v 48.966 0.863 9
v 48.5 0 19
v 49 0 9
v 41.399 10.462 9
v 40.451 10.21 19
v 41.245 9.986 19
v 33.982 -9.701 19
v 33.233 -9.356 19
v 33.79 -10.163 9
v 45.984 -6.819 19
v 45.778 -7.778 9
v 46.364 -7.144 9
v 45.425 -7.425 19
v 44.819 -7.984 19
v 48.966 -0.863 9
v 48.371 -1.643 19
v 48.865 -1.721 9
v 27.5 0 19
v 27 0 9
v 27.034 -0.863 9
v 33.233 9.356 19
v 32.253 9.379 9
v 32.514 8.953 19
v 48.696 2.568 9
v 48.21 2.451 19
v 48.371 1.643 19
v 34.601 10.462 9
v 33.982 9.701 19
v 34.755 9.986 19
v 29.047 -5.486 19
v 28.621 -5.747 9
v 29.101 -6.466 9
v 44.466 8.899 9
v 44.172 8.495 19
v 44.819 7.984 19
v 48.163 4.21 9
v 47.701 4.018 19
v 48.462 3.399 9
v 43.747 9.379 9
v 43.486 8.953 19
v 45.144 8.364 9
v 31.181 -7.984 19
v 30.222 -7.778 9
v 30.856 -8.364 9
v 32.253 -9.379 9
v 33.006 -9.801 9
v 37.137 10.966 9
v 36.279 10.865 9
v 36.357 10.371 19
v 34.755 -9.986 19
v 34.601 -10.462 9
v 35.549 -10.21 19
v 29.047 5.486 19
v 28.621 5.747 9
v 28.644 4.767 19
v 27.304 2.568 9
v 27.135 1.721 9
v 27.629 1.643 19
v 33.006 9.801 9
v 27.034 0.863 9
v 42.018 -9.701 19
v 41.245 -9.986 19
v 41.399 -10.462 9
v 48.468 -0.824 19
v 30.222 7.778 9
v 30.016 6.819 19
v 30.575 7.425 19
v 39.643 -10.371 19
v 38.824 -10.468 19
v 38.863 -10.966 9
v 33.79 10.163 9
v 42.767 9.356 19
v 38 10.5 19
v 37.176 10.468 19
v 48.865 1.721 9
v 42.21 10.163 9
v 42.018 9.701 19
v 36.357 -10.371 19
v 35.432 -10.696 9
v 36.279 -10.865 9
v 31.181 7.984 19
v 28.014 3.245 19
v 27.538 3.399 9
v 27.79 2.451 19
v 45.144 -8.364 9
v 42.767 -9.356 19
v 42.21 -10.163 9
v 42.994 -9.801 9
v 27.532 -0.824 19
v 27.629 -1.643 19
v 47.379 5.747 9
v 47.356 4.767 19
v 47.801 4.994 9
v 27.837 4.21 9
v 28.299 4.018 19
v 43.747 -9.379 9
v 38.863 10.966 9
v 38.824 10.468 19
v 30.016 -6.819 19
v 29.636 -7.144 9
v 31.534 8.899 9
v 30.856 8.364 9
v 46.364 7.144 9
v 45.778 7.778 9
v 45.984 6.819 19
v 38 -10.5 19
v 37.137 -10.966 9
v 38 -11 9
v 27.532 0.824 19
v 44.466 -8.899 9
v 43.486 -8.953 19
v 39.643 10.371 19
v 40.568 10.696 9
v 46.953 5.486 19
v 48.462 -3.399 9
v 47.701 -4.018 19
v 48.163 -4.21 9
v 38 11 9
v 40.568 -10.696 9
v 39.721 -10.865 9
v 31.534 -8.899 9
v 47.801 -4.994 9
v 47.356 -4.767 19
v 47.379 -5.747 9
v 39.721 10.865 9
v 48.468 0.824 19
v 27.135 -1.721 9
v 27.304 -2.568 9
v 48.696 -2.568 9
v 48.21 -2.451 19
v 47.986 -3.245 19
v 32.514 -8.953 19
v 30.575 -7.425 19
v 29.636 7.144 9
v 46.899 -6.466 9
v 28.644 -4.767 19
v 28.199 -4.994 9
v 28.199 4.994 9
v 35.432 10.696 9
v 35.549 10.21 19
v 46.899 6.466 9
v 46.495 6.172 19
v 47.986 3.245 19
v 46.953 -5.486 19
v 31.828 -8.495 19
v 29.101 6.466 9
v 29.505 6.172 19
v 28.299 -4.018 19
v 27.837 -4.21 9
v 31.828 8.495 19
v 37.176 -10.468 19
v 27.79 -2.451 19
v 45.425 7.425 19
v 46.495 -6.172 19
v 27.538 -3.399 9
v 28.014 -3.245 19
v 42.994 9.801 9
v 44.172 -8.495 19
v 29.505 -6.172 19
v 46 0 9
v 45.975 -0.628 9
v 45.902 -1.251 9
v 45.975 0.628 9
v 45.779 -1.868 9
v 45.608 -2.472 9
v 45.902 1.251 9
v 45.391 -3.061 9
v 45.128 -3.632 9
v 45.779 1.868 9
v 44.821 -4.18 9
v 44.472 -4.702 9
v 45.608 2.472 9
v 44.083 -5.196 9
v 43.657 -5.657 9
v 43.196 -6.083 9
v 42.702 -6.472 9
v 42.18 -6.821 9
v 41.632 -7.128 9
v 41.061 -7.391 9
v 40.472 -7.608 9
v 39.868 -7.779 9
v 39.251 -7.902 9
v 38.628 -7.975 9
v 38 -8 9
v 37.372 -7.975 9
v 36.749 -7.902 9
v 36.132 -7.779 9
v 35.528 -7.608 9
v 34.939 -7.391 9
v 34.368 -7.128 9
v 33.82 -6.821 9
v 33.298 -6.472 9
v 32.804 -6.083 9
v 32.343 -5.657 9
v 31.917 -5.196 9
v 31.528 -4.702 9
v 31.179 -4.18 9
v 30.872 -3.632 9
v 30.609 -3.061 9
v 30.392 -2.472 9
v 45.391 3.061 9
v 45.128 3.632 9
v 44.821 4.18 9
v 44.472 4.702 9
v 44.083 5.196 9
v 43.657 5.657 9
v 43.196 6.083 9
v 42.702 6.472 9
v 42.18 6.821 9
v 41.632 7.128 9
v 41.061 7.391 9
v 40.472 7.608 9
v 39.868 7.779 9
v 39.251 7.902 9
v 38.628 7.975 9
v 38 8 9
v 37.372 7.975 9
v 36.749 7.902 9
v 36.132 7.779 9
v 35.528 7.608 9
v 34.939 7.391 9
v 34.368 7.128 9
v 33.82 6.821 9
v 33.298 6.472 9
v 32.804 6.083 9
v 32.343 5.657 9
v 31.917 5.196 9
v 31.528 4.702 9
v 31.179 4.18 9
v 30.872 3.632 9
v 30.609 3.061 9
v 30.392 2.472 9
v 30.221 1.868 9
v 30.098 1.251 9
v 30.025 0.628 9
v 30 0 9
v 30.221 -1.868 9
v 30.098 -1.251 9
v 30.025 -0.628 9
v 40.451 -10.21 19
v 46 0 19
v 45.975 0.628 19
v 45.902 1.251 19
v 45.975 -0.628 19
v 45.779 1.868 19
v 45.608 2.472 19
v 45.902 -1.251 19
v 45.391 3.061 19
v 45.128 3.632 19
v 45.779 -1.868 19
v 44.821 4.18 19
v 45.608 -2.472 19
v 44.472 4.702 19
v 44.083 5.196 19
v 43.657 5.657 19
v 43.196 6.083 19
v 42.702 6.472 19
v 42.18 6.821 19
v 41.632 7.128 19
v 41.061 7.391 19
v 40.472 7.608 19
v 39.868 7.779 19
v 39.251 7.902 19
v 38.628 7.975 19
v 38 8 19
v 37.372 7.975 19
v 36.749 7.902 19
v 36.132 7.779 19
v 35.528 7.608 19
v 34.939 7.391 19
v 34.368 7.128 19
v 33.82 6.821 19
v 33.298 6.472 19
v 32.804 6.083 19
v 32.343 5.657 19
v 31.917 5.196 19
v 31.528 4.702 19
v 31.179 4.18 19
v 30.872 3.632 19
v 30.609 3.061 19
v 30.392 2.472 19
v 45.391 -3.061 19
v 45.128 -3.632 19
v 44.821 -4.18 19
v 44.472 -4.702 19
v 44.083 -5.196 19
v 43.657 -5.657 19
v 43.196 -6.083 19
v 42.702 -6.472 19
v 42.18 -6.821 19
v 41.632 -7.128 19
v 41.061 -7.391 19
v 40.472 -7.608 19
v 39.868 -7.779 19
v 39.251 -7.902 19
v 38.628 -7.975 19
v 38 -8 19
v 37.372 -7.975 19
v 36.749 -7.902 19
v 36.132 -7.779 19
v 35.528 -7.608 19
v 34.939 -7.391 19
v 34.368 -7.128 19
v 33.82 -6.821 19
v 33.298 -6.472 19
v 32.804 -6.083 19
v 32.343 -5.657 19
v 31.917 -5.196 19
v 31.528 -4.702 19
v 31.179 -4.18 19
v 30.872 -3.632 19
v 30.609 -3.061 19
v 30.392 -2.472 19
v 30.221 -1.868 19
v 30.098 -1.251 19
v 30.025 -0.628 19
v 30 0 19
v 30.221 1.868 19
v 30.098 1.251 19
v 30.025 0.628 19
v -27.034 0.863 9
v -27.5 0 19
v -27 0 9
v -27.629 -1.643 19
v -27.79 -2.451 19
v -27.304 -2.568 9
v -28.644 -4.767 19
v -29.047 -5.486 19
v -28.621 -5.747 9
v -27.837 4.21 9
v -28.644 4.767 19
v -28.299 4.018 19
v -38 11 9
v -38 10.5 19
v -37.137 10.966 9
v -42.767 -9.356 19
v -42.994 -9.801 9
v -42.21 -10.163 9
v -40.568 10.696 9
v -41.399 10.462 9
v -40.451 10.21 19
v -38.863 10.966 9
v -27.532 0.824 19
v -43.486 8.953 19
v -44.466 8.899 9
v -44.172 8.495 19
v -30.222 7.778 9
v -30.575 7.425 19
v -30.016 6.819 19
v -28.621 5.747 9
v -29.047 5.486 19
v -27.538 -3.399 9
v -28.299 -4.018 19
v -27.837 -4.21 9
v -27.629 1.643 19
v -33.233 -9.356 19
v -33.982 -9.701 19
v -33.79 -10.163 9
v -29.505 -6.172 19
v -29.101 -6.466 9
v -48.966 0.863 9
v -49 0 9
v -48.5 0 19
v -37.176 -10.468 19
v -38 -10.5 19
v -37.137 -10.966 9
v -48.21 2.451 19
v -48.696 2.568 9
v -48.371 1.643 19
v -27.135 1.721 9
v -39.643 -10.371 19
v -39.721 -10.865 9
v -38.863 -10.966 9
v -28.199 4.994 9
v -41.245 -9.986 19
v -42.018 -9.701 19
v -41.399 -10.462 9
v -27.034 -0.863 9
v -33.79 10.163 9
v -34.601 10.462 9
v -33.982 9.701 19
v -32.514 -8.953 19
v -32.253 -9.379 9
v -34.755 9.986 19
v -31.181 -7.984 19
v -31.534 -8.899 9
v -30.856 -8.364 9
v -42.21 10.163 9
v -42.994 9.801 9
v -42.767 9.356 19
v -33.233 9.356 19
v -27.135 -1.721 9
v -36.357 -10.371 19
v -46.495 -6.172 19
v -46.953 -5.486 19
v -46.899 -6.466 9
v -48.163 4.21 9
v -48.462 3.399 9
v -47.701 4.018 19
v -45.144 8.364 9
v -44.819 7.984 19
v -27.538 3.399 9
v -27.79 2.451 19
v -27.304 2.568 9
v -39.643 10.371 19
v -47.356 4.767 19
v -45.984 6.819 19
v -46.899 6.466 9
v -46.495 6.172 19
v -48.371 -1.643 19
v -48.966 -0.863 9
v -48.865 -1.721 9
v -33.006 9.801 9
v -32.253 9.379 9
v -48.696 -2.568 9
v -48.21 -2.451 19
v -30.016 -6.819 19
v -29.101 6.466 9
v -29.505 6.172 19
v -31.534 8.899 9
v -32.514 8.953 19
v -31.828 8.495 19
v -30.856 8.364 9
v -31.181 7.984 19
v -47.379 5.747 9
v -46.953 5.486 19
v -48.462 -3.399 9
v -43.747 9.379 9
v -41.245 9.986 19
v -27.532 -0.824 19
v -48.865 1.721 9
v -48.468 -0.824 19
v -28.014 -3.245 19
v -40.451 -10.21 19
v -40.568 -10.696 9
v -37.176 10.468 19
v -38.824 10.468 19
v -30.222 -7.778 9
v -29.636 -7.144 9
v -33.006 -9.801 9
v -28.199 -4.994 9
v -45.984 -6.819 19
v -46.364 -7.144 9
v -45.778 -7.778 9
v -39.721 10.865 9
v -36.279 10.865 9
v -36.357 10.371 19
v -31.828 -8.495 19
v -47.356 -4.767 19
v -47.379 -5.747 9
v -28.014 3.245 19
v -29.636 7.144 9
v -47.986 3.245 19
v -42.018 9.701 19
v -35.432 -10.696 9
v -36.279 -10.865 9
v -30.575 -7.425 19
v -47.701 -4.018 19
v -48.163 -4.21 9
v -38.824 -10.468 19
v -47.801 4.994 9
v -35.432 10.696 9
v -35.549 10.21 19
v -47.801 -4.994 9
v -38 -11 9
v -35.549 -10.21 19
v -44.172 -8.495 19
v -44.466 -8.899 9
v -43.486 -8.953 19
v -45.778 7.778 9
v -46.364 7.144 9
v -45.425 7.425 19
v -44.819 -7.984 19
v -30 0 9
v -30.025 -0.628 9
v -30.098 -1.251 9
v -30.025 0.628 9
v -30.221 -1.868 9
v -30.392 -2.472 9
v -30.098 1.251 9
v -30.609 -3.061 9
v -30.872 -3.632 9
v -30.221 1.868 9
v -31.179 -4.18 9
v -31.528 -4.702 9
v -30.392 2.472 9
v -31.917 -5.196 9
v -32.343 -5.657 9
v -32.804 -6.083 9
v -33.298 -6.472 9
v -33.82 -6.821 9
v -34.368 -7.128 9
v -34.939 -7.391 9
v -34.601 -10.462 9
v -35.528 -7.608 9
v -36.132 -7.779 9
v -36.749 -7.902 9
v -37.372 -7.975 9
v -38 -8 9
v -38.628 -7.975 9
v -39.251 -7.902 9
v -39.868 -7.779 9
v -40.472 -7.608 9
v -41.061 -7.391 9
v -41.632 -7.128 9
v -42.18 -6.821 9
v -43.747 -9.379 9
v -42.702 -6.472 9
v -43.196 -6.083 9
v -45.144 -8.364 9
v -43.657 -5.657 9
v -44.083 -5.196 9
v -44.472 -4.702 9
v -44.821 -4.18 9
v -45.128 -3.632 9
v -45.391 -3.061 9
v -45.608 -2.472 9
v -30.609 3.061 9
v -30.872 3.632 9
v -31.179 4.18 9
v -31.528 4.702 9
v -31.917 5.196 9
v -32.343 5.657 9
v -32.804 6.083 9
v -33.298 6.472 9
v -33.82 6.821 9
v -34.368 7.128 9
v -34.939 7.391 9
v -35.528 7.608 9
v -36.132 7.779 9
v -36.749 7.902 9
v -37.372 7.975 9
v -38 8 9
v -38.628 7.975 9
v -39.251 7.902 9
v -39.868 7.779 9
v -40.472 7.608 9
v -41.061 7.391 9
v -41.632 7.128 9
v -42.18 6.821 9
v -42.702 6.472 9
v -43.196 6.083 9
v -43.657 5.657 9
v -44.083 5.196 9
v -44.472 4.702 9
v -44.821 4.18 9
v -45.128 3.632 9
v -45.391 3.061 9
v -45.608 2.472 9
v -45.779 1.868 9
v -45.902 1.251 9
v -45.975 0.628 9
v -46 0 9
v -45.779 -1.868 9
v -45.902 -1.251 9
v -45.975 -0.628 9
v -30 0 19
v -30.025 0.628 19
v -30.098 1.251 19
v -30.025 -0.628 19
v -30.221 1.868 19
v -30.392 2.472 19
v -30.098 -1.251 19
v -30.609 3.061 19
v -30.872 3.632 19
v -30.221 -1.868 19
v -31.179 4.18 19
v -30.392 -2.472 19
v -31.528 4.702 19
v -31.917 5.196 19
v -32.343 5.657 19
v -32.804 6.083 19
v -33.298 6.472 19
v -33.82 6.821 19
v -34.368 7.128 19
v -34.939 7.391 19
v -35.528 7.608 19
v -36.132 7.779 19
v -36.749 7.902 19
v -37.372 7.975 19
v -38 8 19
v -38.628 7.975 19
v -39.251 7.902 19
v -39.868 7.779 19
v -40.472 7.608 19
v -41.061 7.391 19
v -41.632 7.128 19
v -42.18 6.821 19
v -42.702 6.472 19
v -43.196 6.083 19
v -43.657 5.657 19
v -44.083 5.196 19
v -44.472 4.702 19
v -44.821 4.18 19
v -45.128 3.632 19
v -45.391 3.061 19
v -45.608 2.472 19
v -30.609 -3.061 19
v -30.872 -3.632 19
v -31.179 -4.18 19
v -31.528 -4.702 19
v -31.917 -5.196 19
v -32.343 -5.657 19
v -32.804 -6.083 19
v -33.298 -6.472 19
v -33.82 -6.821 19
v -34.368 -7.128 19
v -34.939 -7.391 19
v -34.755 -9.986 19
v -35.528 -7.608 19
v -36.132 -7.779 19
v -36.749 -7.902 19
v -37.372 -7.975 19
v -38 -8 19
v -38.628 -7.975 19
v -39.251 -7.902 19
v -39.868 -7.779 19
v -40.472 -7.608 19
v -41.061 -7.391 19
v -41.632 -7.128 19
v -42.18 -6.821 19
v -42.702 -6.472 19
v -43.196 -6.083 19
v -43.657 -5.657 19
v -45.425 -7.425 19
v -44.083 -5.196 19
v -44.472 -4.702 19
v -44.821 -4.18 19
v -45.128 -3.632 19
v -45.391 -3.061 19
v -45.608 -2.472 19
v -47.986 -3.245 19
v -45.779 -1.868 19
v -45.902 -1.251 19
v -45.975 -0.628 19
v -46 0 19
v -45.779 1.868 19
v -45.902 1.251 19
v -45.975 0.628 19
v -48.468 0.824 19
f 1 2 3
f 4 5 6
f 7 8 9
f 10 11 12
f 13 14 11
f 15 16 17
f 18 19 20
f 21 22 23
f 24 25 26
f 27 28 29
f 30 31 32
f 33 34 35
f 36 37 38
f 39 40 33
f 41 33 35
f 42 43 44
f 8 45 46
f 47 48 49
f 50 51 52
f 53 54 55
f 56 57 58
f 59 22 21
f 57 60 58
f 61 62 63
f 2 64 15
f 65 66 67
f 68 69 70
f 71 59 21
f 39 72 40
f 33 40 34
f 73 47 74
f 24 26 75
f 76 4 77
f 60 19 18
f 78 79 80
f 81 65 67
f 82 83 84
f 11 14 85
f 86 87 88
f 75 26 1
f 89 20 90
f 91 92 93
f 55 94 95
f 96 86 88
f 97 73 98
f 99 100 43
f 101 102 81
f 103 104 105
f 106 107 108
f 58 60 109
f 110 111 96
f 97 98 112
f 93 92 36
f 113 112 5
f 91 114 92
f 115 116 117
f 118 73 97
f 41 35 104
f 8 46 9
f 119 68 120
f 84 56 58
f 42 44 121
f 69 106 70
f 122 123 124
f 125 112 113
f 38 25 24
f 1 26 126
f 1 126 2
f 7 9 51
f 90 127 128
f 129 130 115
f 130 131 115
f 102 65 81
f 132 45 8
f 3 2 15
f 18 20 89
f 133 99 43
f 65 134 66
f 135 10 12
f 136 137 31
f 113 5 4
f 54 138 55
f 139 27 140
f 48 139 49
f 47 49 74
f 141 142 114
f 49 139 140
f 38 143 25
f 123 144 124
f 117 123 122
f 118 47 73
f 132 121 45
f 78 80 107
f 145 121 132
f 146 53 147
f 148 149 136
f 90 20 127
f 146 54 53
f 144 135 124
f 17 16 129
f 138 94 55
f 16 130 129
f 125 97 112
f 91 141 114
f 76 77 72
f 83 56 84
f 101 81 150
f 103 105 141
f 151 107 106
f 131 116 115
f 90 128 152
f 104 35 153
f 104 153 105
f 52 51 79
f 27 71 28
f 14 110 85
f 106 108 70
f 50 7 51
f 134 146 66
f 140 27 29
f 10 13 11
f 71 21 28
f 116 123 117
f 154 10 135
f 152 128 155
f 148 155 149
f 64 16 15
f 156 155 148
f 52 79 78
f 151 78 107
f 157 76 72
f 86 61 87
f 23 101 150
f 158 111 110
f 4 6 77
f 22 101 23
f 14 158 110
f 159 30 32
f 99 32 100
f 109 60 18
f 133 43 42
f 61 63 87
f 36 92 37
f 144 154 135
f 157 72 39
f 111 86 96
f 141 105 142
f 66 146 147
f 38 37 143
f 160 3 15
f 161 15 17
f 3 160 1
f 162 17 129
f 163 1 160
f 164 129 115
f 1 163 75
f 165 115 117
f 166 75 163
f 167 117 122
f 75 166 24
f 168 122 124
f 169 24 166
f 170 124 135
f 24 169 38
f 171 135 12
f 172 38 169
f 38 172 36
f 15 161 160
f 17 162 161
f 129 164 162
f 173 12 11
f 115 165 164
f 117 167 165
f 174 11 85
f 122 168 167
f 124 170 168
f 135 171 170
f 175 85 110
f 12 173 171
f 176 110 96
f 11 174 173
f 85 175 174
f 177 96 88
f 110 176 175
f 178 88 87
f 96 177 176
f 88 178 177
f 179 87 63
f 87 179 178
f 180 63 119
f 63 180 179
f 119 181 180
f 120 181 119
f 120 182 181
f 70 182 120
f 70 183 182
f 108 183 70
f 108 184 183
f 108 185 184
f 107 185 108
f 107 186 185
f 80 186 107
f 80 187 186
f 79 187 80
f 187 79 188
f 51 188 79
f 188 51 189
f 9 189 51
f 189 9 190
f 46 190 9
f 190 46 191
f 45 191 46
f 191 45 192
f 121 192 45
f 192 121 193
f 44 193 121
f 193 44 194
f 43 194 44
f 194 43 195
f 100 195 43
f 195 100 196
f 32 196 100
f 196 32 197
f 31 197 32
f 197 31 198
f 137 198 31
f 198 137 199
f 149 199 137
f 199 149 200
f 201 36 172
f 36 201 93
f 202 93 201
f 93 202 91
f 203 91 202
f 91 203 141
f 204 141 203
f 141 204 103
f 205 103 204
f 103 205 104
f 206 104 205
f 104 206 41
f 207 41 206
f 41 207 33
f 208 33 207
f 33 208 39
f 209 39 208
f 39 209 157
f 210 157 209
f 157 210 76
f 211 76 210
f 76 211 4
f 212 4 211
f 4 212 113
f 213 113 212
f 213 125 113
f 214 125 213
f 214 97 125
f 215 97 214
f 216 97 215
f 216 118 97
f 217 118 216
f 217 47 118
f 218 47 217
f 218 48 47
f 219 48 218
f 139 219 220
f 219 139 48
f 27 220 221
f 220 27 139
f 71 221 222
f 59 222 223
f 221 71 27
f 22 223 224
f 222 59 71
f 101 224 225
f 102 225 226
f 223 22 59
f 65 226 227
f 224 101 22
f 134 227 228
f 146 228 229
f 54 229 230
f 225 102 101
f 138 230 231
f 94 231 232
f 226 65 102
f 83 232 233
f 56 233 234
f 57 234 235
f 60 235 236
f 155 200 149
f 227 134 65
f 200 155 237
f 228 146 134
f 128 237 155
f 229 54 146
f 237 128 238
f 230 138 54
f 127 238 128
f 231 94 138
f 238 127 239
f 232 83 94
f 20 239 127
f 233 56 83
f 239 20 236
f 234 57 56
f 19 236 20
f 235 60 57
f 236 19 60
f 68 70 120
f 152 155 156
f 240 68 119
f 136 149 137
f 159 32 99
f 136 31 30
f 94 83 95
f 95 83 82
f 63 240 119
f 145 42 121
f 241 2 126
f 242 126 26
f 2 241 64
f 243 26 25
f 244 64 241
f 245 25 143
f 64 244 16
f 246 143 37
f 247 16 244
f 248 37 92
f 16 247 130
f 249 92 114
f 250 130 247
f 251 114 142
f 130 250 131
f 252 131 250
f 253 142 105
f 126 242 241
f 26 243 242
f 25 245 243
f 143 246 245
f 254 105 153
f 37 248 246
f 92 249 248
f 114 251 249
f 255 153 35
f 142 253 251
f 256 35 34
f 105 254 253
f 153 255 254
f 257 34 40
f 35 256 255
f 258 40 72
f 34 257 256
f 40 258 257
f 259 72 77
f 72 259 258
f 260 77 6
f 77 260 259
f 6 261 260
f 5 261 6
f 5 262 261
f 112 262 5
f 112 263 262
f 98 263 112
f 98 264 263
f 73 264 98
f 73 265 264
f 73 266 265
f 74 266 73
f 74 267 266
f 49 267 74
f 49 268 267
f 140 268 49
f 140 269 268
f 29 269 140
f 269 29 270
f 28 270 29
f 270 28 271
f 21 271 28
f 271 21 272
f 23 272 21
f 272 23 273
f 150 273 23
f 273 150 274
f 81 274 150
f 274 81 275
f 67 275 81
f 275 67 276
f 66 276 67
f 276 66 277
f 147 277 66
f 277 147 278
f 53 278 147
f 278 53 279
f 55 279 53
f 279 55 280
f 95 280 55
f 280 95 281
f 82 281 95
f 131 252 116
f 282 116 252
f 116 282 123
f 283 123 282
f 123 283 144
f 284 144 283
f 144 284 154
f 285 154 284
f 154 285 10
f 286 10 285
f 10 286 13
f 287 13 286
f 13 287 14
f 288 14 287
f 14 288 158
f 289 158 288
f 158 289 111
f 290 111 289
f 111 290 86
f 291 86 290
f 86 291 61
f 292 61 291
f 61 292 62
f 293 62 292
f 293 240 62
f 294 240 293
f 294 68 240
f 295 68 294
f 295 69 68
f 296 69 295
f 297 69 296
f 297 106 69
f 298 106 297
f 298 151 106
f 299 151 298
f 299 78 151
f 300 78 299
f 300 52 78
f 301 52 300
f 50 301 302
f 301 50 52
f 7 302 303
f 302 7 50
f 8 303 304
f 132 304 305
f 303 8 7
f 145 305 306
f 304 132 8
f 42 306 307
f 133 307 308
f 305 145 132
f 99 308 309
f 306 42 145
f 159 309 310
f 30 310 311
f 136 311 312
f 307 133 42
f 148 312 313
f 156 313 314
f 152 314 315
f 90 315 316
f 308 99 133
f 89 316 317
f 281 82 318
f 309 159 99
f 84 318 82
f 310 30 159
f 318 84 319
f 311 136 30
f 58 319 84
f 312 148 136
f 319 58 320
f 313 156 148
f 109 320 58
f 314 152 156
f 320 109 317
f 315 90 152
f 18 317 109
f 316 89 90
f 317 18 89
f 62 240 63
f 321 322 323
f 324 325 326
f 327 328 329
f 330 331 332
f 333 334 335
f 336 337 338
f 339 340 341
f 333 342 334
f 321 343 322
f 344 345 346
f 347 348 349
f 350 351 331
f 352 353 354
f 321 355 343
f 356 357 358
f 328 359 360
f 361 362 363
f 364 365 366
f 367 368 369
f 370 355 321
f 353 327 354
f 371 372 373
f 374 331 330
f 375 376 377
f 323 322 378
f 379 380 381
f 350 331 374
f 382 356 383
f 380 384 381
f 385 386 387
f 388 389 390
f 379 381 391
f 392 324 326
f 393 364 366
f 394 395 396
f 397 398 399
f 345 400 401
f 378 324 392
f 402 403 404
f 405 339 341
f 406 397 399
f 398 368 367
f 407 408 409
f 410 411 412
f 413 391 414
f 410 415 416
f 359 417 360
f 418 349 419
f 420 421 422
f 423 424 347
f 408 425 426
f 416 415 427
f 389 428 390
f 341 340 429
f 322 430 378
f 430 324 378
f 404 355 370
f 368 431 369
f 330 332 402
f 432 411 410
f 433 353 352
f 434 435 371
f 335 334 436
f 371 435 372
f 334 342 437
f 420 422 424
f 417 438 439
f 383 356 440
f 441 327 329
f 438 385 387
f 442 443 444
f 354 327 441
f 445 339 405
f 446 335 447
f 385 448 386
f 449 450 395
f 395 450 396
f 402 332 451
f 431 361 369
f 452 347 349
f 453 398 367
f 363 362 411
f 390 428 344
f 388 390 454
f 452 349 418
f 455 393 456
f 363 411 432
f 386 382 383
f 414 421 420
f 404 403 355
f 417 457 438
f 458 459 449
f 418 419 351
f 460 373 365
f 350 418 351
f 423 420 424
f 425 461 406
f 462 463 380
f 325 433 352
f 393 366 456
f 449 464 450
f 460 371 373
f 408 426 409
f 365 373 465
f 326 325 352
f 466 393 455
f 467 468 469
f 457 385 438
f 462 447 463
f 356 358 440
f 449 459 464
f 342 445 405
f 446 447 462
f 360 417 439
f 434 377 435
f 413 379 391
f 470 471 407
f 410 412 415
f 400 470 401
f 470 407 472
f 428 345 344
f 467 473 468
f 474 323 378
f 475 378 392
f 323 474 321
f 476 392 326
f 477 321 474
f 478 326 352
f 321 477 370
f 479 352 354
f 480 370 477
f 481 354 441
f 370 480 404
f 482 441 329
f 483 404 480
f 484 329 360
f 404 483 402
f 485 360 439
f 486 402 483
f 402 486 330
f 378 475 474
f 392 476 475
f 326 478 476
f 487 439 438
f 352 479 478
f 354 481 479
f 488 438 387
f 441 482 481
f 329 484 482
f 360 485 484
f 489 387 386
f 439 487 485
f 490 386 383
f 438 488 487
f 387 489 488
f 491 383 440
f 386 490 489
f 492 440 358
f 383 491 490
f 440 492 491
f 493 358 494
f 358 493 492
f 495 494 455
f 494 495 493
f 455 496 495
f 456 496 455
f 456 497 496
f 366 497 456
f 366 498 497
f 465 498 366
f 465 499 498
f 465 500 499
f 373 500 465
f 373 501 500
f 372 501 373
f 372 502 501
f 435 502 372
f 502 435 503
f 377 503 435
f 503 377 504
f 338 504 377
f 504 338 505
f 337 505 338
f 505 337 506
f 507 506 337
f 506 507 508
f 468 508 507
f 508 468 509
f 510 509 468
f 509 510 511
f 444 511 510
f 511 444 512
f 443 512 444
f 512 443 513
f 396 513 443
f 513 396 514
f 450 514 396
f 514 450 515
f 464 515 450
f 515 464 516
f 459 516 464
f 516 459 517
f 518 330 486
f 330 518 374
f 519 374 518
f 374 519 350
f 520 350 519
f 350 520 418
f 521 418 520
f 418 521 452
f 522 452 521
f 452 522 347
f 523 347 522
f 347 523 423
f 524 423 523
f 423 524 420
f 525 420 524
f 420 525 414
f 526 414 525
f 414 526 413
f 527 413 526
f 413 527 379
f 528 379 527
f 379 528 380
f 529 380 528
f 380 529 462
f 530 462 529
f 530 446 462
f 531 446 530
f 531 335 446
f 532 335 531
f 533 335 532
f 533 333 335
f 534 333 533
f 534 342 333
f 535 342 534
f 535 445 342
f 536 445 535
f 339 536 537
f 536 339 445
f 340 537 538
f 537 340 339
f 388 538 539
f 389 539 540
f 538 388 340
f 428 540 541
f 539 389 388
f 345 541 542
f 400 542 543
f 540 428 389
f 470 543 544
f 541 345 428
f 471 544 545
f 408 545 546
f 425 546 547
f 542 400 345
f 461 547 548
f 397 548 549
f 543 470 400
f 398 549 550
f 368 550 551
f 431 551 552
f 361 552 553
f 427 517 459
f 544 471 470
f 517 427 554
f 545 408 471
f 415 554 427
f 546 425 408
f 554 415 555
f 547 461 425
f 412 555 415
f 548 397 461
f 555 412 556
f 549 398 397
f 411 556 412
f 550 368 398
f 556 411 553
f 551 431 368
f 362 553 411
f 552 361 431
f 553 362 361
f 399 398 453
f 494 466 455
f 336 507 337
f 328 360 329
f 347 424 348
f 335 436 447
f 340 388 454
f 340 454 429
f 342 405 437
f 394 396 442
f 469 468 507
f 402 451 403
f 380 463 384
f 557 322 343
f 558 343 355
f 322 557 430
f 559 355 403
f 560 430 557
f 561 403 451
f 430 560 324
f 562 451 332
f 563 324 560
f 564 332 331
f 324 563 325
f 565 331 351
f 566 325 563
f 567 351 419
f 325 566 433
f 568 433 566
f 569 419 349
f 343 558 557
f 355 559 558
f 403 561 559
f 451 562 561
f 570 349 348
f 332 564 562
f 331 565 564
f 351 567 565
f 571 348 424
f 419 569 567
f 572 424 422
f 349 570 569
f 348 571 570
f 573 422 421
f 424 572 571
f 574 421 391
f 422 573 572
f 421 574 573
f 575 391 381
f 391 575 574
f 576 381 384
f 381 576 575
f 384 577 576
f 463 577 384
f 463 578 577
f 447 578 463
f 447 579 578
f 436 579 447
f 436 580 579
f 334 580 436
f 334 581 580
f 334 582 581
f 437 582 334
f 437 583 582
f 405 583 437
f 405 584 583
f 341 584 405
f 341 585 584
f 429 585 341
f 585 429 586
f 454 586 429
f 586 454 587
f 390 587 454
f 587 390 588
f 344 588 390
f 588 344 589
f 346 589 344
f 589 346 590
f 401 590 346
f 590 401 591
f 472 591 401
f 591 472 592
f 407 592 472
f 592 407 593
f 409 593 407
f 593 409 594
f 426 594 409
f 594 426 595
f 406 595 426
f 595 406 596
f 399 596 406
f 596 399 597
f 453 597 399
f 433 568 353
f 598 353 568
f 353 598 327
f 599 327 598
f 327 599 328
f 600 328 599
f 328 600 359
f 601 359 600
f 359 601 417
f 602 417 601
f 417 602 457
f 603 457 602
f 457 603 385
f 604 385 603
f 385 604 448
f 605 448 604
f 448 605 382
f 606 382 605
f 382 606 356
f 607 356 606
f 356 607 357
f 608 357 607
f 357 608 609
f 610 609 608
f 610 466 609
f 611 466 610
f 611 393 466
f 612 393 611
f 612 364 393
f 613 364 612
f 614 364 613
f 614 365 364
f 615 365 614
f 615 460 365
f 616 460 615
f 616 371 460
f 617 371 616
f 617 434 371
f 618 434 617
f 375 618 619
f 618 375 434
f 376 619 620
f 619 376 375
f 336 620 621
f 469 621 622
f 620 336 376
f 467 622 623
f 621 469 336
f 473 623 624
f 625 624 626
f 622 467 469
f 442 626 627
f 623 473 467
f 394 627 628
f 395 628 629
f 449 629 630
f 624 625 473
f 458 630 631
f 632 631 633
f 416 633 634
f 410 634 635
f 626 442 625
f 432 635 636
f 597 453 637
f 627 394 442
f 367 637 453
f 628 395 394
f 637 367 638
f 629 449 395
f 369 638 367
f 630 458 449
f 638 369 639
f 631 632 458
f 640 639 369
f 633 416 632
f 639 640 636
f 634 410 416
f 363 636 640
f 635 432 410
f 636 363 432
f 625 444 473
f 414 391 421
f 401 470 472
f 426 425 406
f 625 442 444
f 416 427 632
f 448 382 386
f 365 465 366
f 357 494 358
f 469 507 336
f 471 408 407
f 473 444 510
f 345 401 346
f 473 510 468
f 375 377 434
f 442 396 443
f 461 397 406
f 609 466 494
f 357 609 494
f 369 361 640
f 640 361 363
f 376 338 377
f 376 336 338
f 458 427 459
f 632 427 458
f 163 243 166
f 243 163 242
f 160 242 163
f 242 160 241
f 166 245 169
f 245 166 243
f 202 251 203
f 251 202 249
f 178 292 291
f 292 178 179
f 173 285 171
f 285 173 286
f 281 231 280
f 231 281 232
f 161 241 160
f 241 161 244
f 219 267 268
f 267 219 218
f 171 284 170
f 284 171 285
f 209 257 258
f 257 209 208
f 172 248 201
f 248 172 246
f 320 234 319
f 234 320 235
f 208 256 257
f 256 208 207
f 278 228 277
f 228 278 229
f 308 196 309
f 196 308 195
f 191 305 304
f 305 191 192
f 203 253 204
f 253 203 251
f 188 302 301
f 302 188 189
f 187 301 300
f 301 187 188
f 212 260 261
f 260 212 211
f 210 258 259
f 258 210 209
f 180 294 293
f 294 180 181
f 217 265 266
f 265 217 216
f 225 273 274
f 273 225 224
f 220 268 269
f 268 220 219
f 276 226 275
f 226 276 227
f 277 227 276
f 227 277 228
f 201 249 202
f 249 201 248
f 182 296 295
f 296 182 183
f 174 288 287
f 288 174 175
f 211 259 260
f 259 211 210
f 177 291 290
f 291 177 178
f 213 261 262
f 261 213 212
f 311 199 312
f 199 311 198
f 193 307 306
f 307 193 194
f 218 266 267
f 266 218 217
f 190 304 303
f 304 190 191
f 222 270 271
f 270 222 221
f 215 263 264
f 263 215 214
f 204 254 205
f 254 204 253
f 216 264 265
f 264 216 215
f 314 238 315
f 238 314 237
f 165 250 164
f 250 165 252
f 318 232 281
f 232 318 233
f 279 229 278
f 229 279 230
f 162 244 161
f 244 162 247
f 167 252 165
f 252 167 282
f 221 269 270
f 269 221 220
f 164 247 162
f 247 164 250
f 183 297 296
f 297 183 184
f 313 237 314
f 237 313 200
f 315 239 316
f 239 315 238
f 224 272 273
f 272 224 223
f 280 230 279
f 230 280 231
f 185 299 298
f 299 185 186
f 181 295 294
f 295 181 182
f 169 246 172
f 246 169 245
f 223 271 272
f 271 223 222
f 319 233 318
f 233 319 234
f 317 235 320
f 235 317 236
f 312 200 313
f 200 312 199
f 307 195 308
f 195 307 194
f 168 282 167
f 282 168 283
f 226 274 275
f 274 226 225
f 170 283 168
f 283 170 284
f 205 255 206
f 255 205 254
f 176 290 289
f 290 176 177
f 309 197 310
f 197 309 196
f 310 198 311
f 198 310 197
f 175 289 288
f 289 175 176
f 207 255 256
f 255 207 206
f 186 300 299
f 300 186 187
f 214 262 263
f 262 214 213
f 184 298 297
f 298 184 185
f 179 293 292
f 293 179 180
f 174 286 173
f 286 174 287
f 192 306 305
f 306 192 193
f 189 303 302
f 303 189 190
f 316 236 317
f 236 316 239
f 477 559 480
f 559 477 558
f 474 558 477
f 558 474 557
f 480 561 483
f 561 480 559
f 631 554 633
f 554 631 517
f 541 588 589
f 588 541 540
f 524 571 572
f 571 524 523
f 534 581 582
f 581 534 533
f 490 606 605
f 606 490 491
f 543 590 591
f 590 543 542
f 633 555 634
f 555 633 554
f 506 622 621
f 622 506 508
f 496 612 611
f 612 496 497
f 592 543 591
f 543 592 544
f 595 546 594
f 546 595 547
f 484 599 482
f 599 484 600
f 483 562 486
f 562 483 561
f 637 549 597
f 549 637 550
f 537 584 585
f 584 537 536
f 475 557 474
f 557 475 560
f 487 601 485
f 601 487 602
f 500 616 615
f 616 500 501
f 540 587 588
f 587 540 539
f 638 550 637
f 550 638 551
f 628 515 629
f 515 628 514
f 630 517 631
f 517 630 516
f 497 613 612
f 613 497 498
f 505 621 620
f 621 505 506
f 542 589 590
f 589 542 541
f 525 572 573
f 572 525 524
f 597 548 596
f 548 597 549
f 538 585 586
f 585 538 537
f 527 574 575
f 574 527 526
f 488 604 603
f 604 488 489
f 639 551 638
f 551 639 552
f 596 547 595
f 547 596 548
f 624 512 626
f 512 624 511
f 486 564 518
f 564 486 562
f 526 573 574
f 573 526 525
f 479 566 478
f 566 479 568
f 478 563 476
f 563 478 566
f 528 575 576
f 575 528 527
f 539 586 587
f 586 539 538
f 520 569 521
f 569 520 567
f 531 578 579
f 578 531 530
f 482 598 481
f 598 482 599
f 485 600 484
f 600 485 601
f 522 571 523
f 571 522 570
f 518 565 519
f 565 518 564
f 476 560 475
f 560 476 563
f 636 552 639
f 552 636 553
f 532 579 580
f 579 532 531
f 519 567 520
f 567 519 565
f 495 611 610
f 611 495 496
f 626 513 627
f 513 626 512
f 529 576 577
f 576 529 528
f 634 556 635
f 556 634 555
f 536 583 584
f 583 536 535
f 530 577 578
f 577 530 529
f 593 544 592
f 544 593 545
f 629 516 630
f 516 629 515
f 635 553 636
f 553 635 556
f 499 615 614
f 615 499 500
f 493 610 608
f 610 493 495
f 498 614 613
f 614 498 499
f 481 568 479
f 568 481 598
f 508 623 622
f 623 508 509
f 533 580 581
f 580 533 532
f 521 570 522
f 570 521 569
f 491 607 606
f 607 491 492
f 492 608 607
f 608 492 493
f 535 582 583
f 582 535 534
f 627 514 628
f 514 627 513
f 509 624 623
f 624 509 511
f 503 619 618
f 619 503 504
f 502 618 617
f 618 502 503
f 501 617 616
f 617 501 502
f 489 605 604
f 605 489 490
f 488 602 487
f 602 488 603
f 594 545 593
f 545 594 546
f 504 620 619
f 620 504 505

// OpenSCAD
/* ======================================================================
 *
 *       Filename:  axeZ_bottom-main.scad
 *
 *    Description:  motors mount 
 *
 *        Version:  1.0
 *        Created:  11 06 2016
 *       Revision:  none
 *       Compiler:  gcc
 *
 *         Author:  Sebastien Chassot (sinux), seba.ptl@sinux.net
 *
 * =====================================================================
 */


support_h = 9;
bearing_d = 15.5;
axe_pos = 76;

axeZ_bottom();

module axeZ_bottom() {
    
    difference(){
        union(){
        /* motor mount */
            linear_extrude(height = support_h, $fn=50)
                import("../profiles/axeZ_bottom-s0.dxf");
            translate([axe_pos/2, 0, support_h])
                cylinder(d1 = 22, d2 = 21, h = 10, $fn = 80);
            translate([-axe_pos/2, 0, support_h])
                cylinder(d1 = 22, d2 = 21, h = 10, $fn = 80);
        }
        
        translate([26.5, -10, support_h/2])
            rotate([90, 0, 0])
            cylinder(d = 3, h = 20, center = true, $fn = 80);
        translate([-26.5, -10, support_h/2])
            rotate([90, 0, 0])
            cylinder(d = 3, h = 20, center = true, $fn = 80); 
        
        translate([axe_pos/2, 0, 0])
            cylinder(d = 16, h = 50, center = true, $fn = 80);
        translate([-axe_pos/2, 0, 0])
            cylinder(d = 16, h = 50, center = true, $fn = 80);
    }
}
